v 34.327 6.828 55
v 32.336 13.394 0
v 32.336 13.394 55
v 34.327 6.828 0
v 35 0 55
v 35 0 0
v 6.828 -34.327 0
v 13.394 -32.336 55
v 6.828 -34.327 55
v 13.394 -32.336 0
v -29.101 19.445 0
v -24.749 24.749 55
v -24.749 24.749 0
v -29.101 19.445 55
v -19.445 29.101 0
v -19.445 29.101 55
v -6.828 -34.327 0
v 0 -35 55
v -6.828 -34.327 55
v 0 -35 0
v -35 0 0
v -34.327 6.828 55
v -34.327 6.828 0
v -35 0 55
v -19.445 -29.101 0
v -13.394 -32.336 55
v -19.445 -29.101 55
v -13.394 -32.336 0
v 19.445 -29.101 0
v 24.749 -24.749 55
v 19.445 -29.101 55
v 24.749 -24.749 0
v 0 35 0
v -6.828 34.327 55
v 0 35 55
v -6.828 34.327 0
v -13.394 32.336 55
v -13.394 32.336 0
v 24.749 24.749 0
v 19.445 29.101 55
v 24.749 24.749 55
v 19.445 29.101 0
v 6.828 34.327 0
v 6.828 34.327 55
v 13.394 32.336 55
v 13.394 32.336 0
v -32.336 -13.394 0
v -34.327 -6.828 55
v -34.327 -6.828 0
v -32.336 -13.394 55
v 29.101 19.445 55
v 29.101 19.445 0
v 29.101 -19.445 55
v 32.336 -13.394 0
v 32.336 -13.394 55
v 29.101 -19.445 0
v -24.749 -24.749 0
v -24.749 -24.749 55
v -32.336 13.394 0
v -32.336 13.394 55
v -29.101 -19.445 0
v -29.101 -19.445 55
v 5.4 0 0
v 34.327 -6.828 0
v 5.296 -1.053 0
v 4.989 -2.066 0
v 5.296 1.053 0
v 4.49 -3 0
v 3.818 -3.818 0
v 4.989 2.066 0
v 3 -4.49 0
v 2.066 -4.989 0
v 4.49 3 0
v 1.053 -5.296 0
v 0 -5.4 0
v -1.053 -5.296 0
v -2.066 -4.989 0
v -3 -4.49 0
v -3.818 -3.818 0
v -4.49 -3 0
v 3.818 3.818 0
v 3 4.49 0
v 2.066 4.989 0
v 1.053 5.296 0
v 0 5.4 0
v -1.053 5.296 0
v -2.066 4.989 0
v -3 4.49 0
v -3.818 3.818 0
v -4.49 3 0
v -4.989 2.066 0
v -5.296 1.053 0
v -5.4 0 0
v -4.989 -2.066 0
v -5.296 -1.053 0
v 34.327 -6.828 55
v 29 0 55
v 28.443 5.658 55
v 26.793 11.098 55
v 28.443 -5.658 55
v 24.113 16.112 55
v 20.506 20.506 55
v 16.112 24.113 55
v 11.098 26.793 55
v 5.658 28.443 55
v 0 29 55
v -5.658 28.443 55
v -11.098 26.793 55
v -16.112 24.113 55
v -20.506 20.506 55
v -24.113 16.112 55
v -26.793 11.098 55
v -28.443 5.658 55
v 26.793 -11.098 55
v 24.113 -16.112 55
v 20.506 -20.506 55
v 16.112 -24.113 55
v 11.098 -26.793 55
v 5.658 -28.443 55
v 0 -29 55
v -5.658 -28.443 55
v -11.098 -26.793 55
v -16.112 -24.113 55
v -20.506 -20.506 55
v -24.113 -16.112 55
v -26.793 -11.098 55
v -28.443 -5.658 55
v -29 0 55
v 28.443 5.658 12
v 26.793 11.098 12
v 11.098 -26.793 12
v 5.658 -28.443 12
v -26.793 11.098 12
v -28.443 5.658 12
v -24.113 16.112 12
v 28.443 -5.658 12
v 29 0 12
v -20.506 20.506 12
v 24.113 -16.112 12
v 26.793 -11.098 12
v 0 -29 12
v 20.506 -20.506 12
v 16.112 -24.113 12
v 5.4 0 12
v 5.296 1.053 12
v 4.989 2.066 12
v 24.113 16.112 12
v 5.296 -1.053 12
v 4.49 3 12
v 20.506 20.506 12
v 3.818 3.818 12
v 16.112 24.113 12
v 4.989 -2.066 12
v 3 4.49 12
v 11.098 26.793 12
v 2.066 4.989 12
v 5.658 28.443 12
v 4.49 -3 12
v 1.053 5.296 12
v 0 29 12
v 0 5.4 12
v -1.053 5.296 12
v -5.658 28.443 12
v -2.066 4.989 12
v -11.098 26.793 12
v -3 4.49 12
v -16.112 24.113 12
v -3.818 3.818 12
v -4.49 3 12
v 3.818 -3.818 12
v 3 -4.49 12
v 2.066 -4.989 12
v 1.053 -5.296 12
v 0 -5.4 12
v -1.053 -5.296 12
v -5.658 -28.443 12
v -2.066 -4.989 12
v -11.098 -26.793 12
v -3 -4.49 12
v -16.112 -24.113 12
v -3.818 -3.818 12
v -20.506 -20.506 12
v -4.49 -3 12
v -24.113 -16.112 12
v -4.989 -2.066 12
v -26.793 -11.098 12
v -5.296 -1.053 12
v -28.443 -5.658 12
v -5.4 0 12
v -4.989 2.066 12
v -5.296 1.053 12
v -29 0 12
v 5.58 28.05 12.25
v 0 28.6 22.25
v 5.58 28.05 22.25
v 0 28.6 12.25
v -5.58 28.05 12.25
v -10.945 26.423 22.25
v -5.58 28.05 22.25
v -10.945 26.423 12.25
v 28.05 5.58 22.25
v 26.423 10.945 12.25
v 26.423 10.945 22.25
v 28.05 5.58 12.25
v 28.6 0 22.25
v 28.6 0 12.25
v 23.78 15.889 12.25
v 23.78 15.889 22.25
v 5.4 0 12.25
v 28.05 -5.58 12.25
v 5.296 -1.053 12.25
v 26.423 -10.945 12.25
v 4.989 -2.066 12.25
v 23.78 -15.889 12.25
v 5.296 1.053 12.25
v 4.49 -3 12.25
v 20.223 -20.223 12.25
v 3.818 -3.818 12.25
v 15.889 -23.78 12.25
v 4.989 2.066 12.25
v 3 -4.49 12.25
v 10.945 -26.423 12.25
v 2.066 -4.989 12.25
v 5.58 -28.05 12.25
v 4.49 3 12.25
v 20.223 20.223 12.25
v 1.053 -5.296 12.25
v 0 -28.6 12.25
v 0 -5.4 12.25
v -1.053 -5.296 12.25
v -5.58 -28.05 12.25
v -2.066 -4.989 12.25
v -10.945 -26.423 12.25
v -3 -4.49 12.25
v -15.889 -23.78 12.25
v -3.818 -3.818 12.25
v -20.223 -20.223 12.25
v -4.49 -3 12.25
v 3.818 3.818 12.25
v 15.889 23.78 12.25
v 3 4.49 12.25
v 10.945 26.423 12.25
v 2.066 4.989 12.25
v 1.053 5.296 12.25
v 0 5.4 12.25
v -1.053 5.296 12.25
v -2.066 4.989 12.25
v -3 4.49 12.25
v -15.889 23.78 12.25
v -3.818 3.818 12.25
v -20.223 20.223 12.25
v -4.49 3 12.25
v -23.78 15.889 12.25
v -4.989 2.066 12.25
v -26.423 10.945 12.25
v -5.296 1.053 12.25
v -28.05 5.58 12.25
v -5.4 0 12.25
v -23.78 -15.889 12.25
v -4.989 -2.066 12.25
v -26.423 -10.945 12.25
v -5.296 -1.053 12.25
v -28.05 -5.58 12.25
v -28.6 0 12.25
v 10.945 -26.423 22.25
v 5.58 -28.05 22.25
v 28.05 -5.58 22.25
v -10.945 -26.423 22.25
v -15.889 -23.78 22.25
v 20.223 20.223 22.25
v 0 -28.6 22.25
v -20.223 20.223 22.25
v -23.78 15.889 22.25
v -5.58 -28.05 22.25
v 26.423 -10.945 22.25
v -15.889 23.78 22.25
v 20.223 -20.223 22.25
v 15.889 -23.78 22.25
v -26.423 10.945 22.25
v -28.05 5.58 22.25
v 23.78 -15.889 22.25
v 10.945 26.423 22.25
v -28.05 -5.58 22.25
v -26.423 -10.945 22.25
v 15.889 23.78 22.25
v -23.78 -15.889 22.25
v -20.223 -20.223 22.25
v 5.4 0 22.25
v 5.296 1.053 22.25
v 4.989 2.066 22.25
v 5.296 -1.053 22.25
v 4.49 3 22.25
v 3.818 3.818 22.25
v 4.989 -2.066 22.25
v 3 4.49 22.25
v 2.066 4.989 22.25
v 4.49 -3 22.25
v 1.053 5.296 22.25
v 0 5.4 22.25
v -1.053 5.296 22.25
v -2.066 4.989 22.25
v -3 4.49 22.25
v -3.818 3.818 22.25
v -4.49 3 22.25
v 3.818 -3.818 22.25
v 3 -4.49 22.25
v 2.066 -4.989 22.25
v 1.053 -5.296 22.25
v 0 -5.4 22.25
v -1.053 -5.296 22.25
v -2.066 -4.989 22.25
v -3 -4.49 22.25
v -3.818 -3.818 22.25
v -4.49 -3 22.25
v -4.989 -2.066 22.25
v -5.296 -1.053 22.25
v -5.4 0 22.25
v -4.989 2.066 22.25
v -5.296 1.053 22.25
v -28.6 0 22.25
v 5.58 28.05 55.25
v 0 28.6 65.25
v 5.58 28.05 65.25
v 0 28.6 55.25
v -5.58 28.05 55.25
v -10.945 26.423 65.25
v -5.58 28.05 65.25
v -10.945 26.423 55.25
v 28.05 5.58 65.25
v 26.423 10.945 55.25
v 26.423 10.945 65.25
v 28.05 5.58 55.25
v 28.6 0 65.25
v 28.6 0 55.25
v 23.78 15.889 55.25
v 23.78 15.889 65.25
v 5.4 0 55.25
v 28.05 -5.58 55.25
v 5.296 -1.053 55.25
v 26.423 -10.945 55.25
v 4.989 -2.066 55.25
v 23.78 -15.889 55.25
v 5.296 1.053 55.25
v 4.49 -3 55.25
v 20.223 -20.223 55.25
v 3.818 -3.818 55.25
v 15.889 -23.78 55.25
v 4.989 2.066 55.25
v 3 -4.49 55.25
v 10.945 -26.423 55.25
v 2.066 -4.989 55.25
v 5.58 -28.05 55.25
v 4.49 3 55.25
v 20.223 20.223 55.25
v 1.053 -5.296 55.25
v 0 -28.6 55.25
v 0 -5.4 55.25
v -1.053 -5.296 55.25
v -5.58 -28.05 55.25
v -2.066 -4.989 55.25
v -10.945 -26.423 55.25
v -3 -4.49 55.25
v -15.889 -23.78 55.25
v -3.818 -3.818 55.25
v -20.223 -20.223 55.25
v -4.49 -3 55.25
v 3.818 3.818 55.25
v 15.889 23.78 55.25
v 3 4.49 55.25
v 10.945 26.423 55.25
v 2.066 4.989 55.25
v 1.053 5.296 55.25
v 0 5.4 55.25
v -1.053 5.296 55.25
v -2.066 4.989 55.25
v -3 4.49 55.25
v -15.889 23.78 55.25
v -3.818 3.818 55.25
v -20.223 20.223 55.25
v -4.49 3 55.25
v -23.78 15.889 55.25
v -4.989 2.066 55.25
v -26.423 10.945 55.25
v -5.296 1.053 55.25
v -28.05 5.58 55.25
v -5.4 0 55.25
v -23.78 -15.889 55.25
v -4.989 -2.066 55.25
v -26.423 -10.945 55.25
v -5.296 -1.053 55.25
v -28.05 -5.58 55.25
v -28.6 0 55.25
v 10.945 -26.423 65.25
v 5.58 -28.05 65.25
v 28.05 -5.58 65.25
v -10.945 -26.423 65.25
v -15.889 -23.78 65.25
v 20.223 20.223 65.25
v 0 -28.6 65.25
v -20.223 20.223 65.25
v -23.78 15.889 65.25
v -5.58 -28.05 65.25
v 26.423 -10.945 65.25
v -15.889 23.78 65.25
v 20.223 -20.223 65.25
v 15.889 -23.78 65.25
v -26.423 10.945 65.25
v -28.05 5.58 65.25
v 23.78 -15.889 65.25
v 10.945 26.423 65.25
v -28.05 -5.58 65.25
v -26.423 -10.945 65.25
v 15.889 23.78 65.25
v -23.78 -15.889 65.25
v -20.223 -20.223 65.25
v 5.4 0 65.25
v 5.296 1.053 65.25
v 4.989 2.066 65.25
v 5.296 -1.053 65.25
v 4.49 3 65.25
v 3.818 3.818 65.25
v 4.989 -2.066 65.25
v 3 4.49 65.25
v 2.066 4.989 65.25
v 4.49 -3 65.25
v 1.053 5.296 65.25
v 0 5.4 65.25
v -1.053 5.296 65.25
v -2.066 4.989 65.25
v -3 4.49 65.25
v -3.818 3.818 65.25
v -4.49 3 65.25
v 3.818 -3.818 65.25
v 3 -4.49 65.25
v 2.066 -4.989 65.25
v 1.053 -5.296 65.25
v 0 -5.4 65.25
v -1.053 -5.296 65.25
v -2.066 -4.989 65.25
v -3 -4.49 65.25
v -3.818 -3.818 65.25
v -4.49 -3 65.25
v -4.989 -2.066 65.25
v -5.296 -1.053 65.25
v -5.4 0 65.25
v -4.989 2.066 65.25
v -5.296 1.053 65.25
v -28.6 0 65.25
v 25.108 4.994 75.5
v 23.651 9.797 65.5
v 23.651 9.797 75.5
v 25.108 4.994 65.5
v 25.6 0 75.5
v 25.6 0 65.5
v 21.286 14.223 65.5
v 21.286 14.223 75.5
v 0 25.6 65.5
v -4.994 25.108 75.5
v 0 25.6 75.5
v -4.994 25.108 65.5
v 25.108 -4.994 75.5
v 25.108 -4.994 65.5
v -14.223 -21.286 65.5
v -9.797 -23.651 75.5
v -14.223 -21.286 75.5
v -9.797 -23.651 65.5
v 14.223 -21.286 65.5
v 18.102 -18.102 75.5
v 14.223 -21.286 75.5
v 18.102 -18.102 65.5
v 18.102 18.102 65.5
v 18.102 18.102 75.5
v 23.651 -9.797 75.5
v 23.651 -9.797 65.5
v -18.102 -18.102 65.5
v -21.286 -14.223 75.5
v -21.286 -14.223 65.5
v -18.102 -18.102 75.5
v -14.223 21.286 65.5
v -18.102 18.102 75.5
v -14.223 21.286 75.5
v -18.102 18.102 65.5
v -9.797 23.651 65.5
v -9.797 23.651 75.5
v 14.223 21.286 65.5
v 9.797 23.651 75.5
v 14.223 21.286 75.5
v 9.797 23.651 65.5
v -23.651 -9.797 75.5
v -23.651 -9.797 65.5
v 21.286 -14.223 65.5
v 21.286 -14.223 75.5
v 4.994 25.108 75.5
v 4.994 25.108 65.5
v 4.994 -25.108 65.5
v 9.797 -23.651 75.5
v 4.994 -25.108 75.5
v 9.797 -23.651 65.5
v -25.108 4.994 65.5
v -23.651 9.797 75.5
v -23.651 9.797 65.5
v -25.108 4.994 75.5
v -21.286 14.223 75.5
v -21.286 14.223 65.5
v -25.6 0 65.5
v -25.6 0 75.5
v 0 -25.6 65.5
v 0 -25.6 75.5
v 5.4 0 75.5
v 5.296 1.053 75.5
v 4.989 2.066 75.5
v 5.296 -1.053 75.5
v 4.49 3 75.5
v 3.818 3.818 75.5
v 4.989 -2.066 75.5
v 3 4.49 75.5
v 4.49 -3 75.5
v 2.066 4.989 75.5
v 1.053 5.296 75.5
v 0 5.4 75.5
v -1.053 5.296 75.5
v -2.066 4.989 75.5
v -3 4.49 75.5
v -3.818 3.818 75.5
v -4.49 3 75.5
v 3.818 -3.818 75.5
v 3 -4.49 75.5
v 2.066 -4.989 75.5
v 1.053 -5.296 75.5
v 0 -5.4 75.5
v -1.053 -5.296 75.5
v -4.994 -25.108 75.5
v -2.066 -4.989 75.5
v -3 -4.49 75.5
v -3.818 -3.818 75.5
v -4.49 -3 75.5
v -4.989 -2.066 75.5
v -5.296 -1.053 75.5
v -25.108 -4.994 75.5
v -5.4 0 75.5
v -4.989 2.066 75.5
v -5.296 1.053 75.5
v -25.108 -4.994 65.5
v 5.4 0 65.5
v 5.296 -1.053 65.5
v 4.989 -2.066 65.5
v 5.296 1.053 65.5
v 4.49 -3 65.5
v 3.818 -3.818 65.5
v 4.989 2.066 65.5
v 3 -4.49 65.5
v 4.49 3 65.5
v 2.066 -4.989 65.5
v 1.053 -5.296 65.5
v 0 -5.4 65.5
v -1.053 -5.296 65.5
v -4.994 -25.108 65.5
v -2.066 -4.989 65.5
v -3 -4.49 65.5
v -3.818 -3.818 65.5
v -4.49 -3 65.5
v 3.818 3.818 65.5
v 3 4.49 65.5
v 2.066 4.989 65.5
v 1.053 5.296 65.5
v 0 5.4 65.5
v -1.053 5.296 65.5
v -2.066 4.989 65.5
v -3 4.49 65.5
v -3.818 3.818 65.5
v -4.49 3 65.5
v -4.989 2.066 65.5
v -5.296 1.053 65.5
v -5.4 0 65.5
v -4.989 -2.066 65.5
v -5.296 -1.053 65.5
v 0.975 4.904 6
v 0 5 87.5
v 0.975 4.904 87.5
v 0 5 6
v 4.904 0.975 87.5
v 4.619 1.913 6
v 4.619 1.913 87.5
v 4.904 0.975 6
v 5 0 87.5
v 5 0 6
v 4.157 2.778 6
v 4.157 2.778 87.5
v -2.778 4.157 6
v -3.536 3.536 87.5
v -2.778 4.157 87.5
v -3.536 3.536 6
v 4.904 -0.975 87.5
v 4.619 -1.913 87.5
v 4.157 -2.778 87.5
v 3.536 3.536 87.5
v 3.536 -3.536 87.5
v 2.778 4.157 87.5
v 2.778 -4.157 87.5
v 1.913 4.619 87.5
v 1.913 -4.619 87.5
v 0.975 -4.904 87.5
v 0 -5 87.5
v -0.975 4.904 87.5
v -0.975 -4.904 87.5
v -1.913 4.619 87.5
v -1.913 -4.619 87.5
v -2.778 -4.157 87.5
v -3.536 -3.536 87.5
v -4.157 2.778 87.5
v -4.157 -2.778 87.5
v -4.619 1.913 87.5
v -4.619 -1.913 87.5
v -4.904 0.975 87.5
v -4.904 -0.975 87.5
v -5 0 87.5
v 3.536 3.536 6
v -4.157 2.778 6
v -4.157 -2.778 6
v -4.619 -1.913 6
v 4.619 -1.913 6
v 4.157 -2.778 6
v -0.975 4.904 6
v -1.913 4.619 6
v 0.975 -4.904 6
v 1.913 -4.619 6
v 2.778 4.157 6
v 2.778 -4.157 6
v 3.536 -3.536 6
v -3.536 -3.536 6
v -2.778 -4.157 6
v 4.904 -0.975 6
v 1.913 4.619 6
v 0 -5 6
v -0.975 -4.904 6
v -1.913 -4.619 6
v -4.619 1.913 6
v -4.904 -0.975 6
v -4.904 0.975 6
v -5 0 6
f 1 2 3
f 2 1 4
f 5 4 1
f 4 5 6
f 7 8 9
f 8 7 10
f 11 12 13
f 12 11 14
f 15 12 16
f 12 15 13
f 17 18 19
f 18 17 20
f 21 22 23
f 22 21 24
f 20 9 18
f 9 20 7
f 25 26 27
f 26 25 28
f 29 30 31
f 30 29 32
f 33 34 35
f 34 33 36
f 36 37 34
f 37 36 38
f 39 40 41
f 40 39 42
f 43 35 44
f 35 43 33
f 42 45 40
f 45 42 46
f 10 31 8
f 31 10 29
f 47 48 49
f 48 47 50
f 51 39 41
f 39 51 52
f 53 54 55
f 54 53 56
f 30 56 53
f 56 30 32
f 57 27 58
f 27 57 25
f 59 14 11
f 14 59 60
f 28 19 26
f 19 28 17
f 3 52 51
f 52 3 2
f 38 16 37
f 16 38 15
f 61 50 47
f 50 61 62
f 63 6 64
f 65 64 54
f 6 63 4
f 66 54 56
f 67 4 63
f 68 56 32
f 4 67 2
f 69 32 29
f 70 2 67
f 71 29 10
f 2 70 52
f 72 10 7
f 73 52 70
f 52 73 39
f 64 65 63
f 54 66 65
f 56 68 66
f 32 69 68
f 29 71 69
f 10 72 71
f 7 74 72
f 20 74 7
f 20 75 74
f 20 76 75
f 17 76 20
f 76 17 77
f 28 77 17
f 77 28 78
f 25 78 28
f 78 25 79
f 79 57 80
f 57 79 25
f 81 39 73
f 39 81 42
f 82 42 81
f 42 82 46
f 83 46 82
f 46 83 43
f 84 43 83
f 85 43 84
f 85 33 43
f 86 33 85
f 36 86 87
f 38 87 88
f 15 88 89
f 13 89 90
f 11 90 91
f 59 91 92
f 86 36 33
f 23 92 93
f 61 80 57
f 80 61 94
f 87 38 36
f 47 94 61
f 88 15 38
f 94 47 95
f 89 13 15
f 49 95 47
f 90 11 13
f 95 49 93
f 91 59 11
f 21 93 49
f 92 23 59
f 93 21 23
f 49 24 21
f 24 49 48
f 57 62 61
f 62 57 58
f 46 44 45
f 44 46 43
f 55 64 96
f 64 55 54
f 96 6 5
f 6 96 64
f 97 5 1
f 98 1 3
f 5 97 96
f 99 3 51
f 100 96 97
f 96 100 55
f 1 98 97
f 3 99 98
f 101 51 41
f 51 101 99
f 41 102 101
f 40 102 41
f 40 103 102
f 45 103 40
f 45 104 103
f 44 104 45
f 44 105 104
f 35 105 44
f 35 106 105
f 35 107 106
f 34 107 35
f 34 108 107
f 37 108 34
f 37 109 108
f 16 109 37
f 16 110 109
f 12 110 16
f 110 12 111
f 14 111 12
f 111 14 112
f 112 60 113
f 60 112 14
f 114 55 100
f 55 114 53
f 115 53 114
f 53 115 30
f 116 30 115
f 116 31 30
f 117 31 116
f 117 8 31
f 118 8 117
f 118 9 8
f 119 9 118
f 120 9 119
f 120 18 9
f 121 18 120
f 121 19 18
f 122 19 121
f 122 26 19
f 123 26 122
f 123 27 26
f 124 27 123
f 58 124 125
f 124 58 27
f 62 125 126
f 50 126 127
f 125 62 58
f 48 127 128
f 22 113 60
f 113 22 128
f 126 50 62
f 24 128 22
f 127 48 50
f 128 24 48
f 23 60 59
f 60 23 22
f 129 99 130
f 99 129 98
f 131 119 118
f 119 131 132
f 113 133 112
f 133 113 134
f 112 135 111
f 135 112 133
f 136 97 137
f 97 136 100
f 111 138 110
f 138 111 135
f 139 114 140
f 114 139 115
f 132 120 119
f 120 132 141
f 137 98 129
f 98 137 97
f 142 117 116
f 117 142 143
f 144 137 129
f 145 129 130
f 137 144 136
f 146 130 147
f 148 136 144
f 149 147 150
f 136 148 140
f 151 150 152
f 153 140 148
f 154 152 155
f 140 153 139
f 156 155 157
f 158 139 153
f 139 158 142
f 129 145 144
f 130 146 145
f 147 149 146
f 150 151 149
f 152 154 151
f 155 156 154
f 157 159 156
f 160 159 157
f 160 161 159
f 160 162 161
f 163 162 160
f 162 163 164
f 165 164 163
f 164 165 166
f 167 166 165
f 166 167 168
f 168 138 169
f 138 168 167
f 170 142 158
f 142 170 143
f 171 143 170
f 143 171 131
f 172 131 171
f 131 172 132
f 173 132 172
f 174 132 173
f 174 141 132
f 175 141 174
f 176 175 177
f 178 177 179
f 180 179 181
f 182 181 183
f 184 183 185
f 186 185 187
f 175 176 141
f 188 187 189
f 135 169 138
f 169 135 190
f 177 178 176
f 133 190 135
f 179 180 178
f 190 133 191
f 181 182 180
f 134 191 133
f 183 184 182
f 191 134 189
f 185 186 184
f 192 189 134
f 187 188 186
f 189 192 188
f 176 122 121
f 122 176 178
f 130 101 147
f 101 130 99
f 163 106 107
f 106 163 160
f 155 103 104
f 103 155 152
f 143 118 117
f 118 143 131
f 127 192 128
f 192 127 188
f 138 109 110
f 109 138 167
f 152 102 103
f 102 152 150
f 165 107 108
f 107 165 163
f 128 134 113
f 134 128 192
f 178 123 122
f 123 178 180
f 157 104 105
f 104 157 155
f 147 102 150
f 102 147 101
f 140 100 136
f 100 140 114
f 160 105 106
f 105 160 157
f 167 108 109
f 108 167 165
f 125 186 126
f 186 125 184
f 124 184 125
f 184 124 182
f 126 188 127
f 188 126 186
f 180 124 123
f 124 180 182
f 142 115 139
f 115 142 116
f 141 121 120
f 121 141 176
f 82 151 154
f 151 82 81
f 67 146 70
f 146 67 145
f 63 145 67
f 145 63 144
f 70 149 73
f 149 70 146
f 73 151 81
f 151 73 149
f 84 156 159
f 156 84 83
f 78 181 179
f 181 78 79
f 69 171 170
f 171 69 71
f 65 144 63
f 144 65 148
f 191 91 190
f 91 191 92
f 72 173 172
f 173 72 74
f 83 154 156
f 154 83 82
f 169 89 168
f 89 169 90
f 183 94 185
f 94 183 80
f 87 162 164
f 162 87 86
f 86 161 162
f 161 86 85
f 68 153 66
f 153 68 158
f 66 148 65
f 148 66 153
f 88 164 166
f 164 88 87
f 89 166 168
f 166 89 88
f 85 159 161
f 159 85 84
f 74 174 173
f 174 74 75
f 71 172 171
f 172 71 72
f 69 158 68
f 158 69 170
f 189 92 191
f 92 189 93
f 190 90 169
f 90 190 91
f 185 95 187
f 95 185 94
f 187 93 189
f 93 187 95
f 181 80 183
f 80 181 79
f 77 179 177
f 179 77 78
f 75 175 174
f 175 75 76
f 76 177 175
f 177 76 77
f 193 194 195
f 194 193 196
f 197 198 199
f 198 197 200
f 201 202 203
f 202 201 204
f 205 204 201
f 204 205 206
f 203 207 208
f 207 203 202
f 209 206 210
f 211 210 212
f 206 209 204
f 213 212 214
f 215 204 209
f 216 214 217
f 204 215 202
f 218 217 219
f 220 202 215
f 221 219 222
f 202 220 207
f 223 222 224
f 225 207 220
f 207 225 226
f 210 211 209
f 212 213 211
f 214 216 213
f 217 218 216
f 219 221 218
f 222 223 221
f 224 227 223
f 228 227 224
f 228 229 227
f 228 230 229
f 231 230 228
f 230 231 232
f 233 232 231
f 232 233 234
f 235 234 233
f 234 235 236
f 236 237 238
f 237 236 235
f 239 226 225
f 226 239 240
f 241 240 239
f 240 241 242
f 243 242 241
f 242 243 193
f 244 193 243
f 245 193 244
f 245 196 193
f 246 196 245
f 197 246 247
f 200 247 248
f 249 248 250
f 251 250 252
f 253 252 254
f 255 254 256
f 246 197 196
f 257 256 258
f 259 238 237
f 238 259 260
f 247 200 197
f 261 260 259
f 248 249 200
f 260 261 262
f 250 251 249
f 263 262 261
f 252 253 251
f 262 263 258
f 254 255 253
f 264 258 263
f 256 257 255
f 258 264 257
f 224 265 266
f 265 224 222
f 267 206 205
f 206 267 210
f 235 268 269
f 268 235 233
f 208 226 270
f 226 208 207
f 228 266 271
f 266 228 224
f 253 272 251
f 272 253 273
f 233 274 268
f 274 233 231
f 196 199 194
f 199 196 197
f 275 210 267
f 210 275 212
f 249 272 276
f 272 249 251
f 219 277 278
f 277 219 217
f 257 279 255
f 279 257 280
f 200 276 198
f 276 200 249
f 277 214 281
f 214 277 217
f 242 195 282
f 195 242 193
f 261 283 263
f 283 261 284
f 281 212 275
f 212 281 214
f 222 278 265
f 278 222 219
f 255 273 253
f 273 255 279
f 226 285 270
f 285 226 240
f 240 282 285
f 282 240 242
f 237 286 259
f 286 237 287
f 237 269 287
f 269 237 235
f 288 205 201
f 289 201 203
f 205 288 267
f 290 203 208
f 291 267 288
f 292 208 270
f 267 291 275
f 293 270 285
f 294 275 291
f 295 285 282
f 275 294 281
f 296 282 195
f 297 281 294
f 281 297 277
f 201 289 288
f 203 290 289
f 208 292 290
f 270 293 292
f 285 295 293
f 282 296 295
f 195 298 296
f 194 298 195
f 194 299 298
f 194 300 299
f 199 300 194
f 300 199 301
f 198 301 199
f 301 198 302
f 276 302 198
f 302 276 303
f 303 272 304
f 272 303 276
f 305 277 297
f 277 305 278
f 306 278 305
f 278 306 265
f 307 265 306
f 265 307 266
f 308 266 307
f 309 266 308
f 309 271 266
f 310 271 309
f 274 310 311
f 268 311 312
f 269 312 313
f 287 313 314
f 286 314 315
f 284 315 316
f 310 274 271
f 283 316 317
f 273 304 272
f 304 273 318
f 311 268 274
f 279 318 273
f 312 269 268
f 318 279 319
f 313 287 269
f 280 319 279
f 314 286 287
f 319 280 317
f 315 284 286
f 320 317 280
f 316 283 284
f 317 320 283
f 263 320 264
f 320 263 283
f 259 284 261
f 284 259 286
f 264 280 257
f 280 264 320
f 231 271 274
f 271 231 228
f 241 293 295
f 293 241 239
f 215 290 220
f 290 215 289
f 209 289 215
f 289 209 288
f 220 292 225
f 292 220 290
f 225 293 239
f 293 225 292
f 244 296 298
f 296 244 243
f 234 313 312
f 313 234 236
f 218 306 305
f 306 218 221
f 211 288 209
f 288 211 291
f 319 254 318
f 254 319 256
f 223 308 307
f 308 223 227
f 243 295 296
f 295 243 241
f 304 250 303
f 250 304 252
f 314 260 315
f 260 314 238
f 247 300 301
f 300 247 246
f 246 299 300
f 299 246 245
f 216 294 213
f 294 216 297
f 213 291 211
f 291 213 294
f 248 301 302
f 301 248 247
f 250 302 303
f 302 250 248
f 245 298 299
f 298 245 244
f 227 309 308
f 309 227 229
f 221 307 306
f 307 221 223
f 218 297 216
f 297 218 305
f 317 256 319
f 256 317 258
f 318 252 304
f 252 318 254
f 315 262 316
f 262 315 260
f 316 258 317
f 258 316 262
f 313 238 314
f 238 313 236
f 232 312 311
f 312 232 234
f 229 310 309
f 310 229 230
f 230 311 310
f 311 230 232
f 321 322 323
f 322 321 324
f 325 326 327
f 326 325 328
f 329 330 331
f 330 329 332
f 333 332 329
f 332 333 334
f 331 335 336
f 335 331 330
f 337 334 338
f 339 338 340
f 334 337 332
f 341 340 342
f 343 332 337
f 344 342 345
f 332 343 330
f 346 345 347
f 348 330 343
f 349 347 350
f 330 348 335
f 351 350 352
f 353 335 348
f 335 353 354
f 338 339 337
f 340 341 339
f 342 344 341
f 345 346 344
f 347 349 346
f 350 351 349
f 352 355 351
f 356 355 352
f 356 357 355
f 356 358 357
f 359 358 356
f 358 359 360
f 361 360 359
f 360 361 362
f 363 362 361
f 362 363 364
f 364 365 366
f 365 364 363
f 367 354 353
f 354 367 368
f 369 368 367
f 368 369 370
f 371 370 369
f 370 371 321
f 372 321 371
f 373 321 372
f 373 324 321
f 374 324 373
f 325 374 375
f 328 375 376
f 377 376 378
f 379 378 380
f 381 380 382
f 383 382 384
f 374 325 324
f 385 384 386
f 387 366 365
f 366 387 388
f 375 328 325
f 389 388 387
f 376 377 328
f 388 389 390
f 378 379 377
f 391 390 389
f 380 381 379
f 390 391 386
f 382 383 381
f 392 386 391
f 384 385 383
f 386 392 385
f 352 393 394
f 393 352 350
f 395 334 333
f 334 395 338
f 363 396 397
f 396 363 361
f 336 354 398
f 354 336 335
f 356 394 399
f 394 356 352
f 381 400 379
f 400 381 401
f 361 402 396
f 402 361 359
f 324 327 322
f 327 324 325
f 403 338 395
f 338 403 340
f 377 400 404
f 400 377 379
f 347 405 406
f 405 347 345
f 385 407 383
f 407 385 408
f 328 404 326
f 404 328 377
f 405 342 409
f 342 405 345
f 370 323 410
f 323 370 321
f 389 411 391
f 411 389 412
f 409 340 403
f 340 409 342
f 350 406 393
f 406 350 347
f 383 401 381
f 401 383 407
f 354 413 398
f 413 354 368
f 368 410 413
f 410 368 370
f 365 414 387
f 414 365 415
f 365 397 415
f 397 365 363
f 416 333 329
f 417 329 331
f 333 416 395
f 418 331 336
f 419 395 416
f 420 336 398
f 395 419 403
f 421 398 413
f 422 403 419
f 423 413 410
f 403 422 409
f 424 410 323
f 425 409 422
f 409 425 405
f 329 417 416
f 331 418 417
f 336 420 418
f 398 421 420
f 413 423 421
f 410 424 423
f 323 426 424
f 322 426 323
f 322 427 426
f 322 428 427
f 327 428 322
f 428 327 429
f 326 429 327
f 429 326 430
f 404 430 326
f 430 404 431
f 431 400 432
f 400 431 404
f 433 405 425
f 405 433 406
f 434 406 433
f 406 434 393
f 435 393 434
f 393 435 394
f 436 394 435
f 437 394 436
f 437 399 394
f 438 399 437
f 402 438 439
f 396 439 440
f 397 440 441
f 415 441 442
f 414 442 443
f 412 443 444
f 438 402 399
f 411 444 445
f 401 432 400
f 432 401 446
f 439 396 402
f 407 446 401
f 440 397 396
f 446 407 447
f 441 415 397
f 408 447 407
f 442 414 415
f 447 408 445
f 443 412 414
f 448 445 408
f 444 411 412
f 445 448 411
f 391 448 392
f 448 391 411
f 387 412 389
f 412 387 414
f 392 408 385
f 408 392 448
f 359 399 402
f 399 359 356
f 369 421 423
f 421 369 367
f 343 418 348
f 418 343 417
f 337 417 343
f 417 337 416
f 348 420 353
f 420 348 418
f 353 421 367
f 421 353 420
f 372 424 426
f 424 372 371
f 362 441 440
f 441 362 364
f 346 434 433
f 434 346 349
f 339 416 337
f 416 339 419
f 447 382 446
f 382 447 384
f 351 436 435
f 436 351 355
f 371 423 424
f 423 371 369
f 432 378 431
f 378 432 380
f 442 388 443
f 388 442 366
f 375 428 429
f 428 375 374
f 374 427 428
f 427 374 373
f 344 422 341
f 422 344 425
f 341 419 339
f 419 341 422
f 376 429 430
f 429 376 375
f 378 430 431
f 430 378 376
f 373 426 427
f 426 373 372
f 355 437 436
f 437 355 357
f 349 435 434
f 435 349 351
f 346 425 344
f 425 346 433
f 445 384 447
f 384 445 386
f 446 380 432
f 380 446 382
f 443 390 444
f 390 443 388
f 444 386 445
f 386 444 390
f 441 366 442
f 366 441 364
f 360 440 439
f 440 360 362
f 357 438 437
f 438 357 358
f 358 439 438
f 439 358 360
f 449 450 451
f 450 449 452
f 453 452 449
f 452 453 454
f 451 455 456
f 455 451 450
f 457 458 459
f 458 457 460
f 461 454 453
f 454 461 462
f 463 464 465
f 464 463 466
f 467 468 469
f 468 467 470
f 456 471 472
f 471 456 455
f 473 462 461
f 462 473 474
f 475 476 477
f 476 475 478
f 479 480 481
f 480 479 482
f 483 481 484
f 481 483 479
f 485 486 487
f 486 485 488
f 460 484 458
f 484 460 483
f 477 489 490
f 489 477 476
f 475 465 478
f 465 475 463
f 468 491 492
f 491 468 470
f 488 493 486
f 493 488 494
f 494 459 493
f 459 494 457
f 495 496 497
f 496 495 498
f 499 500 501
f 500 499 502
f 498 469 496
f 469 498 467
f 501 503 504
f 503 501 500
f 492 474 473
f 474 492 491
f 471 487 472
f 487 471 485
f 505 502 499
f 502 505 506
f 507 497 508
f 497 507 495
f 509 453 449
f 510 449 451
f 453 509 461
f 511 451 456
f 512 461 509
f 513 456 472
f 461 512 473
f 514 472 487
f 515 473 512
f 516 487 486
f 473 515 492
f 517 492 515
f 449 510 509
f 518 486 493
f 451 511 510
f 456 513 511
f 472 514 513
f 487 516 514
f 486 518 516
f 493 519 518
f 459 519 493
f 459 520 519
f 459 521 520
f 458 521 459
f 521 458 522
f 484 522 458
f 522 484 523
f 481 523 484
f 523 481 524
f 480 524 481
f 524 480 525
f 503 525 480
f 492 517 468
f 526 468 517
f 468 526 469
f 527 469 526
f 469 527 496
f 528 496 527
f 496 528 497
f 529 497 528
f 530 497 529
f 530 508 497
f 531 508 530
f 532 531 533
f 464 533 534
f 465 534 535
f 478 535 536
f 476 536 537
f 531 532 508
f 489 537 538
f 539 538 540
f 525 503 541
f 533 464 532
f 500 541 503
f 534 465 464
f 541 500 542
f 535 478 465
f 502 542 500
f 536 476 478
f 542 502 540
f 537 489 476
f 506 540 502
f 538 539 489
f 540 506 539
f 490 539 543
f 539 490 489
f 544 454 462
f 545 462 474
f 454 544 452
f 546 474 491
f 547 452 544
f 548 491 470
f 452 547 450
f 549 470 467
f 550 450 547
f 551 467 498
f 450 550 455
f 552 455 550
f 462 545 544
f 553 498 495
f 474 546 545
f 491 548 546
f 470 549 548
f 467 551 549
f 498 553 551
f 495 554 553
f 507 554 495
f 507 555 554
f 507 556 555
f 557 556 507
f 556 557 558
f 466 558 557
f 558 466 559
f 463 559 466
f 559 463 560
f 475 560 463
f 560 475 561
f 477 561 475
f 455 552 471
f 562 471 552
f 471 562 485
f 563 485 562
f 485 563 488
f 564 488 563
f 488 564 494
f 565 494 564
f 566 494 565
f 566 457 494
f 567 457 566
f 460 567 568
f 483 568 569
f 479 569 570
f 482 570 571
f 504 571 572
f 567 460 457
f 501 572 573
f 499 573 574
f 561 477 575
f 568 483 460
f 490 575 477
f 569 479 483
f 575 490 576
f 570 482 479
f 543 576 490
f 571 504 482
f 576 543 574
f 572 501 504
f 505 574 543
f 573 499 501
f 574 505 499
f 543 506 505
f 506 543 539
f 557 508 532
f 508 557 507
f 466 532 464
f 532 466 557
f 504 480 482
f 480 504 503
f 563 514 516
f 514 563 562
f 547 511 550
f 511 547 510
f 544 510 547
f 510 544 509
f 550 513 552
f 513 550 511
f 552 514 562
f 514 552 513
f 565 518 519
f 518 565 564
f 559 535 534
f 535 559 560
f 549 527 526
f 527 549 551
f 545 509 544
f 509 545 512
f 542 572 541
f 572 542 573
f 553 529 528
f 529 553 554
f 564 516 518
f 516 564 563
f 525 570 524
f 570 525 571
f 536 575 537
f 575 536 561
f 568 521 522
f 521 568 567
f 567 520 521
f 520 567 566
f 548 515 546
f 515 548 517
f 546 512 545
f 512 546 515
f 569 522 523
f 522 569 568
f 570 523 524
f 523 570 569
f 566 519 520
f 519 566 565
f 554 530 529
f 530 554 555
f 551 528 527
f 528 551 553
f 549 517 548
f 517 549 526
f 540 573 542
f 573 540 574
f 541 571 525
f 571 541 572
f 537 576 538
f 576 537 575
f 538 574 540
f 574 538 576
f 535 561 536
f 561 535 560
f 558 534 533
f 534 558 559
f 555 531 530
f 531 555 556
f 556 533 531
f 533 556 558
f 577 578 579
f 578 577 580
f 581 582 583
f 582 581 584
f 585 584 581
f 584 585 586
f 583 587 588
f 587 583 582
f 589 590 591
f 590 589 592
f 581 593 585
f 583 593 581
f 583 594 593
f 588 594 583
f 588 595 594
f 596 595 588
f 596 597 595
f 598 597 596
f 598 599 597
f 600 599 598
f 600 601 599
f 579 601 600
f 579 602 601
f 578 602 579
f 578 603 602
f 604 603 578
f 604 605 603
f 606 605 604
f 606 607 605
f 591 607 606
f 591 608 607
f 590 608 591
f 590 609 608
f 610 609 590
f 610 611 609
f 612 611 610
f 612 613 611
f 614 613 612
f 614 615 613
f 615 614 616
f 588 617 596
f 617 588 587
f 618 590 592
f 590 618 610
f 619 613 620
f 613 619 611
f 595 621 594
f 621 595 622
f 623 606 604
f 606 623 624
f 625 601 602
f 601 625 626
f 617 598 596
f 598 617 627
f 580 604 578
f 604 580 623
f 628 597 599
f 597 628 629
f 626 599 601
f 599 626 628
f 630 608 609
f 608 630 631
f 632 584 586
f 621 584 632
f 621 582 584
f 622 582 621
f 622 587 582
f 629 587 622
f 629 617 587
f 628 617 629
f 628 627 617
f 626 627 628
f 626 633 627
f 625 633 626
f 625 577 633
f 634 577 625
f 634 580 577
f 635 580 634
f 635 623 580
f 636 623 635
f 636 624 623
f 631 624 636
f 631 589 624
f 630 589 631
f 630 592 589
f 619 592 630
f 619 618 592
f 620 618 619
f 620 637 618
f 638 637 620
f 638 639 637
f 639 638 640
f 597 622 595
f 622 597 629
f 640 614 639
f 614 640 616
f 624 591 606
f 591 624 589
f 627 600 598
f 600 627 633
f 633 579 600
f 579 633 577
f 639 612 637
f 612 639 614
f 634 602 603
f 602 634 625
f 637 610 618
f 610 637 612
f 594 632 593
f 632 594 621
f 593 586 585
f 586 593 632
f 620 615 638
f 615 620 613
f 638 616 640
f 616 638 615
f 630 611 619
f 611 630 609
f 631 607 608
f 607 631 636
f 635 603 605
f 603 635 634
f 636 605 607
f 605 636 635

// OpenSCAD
$fn = 32;

// ------------------------------------------------------------------------
// Bearing housing: housing d70, two bearings and a shaft
// Every part is its own module, assembly() places them once.
// ------------------------------------------------------------------------

// --- part 1 ---
module housing() {
  difference() {
    cylinder(h = 55, d = 70);
    translate([0, 0, 12]) cylinder(h = 44, d = 58);
    translate([0, 0, -1]) cylinder(h = 14, d = 10.8);
  }
}

// --- part 2 ---
module bearing_lower() {
  difference() {
      translate([0, 0, 0]) cylinder(h = 10, d = 57.2);
      translate([0, 0, -1]) cylinder(h = 12, d = 10.8);
    }
}

// --- part 3 ---
module bearing_upper() {
  difference() {
      translate([0, 0, 0]) cylinder(h = 10, d = 57.2);
      translate([0, 0, -1]) cylinder(h = 12, d = 10.8);
    }
}

// --- part 4 ---
module spacer() {
  difference() {
      translate([0, 0, 0]) cylinder(h = 10, d = 51.2);
      translate([0, 0, -1]) cylinder(h = 12, d = 10.8);
    }
}

// --- part 5 ---
module shaft() {
  translate([0, 0, -40.75]) cylinder(h = 81.5, d = 10);
}

// --- assembly ---
module assembly() {
  translate([0, 0, 0]) rotate([0, 0, 0]) housing();
  translate([0, 0, 12.25]) rotate([0, 0, 0]) bearing_lower();
  translate([0, 0, 55.25]) rotate([0, 0, 0]) bearing_upper();
  translate([0, 0, 65.5]) rotate([0, 0, 0]) spacer();
  translate([0, 0, 46.75]) rotate([0, 0, 0]) shaft();
}

assembly();
